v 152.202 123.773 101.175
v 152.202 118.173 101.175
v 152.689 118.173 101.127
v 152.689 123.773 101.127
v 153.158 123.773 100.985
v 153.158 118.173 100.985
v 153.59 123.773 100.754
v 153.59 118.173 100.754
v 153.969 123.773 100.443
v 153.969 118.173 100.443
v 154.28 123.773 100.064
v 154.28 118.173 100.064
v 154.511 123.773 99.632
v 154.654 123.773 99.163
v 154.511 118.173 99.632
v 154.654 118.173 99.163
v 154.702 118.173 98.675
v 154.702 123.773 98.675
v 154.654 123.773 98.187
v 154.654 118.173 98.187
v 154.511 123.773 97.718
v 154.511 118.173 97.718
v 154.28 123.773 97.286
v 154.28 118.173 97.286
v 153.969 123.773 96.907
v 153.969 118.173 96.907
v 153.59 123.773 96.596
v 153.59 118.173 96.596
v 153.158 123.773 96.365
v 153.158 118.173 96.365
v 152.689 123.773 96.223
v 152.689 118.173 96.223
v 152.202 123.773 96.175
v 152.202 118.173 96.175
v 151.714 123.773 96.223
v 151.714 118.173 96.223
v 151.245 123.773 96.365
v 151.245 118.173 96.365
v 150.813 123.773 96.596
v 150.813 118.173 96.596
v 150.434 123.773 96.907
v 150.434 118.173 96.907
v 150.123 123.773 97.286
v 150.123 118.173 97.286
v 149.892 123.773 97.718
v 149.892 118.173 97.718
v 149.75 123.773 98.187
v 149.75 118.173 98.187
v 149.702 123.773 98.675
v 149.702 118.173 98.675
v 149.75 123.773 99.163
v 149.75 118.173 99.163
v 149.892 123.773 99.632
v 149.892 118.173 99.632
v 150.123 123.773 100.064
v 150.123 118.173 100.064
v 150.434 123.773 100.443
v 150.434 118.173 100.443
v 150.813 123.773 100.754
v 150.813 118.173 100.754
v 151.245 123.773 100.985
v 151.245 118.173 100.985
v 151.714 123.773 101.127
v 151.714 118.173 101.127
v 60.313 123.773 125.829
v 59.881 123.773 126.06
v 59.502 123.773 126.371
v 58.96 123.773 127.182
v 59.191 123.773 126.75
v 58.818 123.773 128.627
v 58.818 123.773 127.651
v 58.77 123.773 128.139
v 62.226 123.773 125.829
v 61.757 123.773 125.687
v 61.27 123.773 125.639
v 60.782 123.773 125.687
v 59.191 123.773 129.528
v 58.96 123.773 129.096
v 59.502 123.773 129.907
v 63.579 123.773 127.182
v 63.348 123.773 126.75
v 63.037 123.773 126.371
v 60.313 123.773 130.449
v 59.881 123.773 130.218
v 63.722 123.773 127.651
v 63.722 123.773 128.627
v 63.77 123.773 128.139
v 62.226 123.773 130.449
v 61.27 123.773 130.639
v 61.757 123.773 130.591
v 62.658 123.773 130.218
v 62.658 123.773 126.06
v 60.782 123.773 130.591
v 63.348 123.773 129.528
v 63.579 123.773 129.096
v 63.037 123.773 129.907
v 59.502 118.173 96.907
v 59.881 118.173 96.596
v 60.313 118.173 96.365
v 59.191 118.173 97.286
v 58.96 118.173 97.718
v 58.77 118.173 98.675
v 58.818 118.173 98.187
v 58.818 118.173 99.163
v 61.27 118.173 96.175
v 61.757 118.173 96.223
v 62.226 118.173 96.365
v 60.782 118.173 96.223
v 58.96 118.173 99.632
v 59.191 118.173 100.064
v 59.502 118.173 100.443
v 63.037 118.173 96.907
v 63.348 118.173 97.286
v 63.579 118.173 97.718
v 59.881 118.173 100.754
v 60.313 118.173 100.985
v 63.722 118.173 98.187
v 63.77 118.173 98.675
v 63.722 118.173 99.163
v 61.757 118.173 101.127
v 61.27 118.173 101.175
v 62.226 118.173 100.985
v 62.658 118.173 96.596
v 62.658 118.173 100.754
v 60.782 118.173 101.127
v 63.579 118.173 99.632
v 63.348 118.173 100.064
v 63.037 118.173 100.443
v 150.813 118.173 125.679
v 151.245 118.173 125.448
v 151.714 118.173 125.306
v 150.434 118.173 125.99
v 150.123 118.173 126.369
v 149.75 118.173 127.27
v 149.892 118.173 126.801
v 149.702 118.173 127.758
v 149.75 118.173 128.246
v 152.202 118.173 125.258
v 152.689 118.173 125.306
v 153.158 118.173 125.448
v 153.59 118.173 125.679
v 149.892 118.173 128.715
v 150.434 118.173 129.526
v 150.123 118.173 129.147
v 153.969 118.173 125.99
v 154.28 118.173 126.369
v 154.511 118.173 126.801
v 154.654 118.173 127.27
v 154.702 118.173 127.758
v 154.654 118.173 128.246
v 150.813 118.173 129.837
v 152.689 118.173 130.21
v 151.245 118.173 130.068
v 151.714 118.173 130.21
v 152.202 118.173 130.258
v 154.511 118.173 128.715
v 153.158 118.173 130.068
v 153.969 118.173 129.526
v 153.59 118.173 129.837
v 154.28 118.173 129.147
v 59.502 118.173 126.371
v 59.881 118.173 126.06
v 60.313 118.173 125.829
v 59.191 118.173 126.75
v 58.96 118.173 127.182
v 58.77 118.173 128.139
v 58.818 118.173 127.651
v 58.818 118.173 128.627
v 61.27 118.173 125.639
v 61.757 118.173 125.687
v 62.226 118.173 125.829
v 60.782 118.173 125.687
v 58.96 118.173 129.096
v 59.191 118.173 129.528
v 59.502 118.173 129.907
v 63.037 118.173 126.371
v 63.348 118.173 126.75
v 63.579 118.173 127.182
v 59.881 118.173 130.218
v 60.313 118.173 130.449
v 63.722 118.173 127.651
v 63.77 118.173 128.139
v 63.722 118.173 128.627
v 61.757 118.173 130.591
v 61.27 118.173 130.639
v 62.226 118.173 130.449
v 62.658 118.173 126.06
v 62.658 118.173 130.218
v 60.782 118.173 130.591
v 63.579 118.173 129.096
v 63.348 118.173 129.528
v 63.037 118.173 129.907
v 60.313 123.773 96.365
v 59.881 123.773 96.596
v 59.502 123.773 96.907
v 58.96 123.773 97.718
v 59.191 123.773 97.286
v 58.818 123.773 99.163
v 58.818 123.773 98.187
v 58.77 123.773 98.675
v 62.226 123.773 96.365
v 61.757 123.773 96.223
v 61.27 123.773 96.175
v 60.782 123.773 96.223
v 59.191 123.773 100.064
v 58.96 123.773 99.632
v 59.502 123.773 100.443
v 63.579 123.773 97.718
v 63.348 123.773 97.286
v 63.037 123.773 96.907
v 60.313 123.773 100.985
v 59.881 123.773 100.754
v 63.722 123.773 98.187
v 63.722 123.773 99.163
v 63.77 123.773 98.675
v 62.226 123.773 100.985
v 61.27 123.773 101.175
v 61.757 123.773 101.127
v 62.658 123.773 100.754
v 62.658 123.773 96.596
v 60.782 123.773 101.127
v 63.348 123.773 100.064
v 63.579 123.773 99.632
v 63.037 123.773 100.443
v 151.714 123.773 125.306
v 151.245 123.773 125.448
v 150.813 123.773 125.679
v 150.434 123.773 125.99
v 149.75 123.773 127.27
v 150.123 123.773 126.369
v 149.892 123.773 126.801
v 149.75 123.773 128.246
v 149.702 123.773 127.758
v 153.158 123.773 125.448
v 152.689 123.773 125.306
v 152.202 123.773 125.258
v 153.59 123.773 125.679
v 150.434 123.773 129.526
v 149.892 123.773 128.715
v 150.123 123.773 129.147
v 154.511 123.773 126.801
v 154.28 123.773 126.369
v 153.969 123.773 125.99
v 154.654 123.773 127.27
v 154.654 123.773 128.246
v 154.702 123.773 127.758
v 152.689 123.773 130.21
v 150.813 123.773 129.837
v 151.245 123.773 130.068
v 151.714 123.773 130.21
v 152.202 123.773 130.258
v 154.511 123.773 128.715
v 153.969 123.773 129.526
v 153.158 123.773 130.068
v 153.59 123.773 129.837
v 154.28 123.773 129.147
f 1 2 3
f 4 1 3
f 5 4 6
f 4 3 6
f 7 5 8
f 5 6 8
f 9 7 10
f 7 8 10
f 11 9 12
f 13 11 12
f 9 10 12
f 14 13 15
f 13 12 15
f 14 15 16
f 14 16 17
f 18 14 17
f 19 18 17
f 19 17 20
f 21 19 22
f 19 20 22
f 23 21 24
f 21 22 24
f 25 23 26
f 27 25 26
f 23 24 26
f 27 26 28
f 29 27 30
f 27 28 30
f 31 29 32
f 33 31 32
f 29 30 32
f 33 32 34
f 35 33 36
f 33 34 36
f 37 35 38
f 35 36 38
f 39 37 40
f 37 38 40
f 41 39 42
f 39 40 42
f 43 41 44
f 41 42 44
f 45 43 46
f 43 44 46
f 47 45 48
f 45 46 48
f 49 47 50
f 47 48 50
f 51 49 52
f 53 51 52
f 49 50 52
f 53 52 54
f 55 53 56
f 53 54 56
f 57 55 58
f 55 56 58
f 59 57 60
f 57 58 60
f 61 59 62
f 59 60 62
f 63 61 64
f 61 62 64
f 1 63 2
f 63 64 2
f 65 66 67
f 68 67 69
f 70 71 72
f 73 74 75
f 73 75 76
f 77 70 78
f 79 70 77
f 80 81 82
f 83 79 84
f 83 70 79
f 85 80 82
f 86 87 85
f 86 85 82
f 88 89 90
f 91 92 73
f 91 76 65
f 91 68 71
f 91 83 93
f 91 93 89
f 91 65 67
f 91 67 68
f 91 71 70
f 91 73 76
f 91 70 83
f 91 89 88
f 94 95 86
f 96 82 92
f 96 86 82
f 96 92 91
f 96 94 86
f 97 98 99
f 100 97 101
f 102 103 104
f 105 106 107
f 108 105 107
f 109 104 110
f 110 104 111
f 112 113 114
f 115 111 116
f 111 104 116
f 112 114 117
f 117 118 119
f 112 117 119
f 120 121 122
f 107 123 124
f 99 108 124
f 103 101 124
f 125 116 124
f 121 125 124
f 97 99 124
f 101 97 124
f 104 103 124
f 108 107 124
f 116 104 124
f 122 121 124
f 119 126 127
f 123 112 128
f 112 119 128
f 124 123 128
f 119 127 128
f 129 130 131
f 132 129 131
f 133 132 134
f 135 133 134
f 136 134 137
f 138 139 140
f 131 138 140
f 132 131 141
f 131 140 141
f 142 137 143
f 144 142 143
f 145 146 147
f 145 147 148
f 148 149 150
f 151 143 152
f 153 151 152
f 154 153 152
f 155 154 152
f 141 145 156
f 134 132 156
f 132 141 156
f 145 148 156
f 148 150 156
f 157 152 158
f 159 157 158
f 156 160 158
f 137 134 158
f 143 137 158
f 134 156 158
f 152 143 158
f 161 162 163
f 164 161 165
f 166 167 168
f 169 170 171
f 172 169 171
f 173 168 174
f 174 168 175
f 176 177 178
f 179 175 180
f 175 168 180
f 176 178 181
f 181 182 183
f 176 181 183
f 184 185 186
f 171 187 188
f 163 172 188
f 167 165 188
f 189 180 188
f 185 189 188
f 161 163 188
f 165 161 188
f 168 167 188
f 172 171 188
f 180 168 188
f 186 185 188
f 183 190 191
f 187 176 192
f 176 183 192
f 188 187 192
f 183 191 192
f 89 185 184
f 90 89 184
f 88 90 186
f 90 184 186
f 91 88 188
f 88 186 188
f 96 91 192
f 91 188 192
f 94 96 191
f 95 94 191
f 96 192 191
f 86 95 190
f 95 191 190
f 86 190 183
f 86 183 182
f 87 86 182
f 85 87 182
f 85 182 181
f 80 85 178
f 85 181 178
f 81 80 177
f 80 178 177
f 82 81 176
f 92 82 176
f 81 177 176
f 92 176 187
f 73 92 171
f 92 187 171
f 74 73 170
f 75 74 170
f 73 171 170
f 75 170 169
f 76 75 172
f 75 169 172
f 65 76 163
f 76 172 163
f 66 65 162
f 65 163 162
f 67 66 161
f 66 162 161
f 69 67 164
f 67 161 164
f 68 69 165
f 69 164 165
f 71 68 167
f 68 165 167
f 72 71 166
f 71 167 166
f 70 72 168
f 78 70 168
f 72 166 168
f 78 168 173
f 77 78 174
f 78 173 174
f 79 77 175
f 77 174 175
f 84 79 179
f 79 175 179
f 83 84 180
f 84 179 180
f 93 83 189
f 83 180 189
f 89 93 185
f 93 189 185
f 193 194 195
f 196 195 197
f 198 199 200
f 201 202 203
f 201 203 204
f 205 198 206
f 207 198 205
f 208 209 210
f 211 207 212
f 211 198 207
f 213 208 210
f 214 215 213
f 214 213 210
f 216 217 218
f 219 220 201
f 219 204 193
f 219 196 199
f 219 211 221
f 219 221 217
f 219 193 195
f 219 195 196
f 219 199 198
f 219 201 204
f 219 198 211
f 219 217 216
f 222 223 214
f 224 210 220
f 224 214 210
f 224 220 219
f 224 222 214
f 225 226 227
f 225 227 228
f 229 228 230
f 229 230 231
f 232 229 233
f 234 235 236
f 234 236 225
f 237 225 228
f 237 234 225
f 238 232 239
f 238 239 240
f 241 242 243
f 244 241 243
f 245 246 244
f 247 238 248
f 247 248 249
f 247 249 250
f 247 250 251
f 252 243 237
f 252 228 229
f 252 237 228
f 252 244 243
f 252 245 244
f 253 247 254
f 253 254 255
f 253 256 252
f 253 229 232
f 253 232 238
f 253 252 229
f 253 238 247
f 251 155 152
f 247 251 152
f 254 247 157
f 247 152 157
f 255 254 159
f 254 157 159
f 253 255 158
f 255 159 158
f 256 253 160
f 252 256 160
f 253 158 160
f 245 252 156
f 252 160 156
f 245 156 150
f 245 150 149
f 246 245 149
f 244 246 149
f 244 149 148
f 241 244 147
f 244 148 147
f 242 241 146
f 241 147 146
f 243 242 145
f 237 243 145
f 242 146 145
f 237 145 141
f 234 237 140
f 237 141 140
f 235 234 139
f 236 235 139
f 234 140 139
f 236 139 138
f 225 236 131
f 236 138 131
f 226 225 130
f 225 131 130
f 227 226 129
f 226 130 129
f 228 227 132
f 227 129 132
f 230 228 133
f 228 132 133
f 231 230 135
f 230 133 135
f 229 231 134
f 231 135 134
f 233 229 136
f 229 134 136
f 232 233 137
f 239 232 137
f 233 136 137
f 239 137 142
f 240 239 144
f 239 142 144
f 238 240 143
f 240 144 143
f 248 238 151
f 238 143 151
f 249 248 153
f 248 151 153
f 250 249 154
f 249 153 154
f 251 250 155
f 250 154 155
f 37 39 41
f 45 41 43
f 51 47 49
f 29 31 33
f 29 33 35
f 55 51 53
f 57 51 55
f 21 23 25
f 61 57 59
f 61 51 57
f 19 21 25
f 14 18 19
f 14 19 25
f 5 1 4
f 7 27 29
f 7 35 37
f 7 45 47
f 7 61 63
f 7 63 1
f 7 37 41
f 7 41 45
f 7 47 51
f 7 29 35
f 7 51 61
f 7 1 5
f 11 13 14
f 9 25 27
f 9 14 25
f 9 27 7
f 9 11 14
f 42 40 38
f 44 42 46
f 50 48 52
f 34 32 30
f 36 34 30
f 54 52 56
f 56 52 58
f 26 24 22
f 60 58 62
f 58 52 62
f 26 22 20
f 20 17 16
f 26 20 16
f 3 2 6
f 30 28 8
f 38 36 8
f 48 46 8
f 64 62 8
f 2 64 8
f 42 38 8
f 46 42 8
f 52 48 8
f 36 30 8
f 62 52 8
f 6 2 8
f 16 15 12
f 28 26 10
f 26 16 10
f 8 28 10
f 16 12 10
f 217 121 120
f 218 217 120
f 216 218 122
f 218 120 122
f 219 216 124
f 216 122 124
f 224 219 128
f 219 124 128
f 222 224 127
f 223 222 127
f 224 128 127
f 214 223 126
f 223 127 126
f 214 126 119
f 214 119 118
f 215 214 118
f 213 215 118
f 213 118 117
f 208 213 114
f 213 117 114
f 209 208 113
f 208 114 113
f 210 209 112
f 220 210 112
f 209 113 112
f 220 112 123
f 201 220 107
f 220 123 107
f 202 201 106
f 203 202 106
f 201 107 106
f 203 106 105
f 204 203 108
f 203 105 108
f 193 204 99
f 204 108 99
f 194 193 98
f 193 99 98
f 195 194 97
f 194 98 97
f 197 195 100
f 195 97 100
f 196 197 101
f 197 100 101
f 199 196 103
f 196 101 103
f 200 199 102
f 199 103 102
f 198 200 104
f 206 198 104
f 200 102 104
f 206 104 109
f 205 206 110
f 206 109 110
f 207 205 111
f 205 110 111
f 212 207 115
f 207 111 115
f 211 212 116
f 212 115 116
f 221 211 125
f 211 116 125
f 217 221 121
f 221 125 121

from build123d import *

# Parameters (mm, degrees)
SKETCH1_R             = 2.5
BOSS_EXTRUDE1_DEPTH   = 5.6
BOSS_EXTRUDE1_2_DEPTH = 5.6
BOSS_EXTRUDE1_3_DEPTH = 5.6
BOSS_EXTRUDE1_4_DEPTH = 5.6


with BuildPart() as part:
    # Sketch1 → Boss-Extrude1 (new body)
    with BuildSketch(Plane(origin=(0, 118.172945129, -8.6e-08), x_dir=(1, 0, 0), z_dir=(0, 1.0, -7.252377726141292e-10))):
        with Locations(Location((152.201551007, -98.67514808, 0), (0, 0, 270))):
            Circle(SKETCH1_R)
    extrude(amount=BOSS_EXTRUDE1_DEPTH)


with BuildPart() as body_2:
    # Sketch1 → Boss-Extrude1 2 (new body)
    with BuildSketch(Plane(origin=(0, 118.172945129, -8.6e-08), x_dir=(1, 0, 0), z_dir=(0, 1.0, -7.252377726141292e-10))):
        with Locations(Location((61.269551007, -98.67514808, 0), (0, 0, 270))):
            Circle(SKETCH1_R)
    extrude(amount=BOSS_EXTRUDE1_2_DEPTH)


with BuildPart() as body_3:
    # Sketch1 → Boss-Extrude1 3 (new body)
    with BuildSketch(Plane(origin=(0, 118.172945129, -8.6e-08), x_dir=(1, 0, 0), z_dir=(0, 1.0, -7.252377726141292e-10))):
        with Locations(Location((61.269551007, -128.13914808, 0), (0, 0, 270))):
            Circle(SKETCH1_R)
    extrude(amount=BOSS_EXTRUDE1_3_DEPTH)


with BuildPart() as body_4:
    # Sketch1 → Boss-Extrude1 4 (new body)
    with BuildSketch(Plane(origin=(0, 118.172945129, -8.6e-08), x_dir=(1, 0, 0), z_dir=(0, 1.0, -7.252377726141292e-10))):
        with Locations(Location((152.201551007, -127.75814808, 0), (0, 0, 270))):
            Circle(SKETCH1_R)
    extrude(amount=BOSS_EXTRUDE1_4_DEPTH)


solid = Compound([part.part, body_2.part, body_3.part, body_4.part])
